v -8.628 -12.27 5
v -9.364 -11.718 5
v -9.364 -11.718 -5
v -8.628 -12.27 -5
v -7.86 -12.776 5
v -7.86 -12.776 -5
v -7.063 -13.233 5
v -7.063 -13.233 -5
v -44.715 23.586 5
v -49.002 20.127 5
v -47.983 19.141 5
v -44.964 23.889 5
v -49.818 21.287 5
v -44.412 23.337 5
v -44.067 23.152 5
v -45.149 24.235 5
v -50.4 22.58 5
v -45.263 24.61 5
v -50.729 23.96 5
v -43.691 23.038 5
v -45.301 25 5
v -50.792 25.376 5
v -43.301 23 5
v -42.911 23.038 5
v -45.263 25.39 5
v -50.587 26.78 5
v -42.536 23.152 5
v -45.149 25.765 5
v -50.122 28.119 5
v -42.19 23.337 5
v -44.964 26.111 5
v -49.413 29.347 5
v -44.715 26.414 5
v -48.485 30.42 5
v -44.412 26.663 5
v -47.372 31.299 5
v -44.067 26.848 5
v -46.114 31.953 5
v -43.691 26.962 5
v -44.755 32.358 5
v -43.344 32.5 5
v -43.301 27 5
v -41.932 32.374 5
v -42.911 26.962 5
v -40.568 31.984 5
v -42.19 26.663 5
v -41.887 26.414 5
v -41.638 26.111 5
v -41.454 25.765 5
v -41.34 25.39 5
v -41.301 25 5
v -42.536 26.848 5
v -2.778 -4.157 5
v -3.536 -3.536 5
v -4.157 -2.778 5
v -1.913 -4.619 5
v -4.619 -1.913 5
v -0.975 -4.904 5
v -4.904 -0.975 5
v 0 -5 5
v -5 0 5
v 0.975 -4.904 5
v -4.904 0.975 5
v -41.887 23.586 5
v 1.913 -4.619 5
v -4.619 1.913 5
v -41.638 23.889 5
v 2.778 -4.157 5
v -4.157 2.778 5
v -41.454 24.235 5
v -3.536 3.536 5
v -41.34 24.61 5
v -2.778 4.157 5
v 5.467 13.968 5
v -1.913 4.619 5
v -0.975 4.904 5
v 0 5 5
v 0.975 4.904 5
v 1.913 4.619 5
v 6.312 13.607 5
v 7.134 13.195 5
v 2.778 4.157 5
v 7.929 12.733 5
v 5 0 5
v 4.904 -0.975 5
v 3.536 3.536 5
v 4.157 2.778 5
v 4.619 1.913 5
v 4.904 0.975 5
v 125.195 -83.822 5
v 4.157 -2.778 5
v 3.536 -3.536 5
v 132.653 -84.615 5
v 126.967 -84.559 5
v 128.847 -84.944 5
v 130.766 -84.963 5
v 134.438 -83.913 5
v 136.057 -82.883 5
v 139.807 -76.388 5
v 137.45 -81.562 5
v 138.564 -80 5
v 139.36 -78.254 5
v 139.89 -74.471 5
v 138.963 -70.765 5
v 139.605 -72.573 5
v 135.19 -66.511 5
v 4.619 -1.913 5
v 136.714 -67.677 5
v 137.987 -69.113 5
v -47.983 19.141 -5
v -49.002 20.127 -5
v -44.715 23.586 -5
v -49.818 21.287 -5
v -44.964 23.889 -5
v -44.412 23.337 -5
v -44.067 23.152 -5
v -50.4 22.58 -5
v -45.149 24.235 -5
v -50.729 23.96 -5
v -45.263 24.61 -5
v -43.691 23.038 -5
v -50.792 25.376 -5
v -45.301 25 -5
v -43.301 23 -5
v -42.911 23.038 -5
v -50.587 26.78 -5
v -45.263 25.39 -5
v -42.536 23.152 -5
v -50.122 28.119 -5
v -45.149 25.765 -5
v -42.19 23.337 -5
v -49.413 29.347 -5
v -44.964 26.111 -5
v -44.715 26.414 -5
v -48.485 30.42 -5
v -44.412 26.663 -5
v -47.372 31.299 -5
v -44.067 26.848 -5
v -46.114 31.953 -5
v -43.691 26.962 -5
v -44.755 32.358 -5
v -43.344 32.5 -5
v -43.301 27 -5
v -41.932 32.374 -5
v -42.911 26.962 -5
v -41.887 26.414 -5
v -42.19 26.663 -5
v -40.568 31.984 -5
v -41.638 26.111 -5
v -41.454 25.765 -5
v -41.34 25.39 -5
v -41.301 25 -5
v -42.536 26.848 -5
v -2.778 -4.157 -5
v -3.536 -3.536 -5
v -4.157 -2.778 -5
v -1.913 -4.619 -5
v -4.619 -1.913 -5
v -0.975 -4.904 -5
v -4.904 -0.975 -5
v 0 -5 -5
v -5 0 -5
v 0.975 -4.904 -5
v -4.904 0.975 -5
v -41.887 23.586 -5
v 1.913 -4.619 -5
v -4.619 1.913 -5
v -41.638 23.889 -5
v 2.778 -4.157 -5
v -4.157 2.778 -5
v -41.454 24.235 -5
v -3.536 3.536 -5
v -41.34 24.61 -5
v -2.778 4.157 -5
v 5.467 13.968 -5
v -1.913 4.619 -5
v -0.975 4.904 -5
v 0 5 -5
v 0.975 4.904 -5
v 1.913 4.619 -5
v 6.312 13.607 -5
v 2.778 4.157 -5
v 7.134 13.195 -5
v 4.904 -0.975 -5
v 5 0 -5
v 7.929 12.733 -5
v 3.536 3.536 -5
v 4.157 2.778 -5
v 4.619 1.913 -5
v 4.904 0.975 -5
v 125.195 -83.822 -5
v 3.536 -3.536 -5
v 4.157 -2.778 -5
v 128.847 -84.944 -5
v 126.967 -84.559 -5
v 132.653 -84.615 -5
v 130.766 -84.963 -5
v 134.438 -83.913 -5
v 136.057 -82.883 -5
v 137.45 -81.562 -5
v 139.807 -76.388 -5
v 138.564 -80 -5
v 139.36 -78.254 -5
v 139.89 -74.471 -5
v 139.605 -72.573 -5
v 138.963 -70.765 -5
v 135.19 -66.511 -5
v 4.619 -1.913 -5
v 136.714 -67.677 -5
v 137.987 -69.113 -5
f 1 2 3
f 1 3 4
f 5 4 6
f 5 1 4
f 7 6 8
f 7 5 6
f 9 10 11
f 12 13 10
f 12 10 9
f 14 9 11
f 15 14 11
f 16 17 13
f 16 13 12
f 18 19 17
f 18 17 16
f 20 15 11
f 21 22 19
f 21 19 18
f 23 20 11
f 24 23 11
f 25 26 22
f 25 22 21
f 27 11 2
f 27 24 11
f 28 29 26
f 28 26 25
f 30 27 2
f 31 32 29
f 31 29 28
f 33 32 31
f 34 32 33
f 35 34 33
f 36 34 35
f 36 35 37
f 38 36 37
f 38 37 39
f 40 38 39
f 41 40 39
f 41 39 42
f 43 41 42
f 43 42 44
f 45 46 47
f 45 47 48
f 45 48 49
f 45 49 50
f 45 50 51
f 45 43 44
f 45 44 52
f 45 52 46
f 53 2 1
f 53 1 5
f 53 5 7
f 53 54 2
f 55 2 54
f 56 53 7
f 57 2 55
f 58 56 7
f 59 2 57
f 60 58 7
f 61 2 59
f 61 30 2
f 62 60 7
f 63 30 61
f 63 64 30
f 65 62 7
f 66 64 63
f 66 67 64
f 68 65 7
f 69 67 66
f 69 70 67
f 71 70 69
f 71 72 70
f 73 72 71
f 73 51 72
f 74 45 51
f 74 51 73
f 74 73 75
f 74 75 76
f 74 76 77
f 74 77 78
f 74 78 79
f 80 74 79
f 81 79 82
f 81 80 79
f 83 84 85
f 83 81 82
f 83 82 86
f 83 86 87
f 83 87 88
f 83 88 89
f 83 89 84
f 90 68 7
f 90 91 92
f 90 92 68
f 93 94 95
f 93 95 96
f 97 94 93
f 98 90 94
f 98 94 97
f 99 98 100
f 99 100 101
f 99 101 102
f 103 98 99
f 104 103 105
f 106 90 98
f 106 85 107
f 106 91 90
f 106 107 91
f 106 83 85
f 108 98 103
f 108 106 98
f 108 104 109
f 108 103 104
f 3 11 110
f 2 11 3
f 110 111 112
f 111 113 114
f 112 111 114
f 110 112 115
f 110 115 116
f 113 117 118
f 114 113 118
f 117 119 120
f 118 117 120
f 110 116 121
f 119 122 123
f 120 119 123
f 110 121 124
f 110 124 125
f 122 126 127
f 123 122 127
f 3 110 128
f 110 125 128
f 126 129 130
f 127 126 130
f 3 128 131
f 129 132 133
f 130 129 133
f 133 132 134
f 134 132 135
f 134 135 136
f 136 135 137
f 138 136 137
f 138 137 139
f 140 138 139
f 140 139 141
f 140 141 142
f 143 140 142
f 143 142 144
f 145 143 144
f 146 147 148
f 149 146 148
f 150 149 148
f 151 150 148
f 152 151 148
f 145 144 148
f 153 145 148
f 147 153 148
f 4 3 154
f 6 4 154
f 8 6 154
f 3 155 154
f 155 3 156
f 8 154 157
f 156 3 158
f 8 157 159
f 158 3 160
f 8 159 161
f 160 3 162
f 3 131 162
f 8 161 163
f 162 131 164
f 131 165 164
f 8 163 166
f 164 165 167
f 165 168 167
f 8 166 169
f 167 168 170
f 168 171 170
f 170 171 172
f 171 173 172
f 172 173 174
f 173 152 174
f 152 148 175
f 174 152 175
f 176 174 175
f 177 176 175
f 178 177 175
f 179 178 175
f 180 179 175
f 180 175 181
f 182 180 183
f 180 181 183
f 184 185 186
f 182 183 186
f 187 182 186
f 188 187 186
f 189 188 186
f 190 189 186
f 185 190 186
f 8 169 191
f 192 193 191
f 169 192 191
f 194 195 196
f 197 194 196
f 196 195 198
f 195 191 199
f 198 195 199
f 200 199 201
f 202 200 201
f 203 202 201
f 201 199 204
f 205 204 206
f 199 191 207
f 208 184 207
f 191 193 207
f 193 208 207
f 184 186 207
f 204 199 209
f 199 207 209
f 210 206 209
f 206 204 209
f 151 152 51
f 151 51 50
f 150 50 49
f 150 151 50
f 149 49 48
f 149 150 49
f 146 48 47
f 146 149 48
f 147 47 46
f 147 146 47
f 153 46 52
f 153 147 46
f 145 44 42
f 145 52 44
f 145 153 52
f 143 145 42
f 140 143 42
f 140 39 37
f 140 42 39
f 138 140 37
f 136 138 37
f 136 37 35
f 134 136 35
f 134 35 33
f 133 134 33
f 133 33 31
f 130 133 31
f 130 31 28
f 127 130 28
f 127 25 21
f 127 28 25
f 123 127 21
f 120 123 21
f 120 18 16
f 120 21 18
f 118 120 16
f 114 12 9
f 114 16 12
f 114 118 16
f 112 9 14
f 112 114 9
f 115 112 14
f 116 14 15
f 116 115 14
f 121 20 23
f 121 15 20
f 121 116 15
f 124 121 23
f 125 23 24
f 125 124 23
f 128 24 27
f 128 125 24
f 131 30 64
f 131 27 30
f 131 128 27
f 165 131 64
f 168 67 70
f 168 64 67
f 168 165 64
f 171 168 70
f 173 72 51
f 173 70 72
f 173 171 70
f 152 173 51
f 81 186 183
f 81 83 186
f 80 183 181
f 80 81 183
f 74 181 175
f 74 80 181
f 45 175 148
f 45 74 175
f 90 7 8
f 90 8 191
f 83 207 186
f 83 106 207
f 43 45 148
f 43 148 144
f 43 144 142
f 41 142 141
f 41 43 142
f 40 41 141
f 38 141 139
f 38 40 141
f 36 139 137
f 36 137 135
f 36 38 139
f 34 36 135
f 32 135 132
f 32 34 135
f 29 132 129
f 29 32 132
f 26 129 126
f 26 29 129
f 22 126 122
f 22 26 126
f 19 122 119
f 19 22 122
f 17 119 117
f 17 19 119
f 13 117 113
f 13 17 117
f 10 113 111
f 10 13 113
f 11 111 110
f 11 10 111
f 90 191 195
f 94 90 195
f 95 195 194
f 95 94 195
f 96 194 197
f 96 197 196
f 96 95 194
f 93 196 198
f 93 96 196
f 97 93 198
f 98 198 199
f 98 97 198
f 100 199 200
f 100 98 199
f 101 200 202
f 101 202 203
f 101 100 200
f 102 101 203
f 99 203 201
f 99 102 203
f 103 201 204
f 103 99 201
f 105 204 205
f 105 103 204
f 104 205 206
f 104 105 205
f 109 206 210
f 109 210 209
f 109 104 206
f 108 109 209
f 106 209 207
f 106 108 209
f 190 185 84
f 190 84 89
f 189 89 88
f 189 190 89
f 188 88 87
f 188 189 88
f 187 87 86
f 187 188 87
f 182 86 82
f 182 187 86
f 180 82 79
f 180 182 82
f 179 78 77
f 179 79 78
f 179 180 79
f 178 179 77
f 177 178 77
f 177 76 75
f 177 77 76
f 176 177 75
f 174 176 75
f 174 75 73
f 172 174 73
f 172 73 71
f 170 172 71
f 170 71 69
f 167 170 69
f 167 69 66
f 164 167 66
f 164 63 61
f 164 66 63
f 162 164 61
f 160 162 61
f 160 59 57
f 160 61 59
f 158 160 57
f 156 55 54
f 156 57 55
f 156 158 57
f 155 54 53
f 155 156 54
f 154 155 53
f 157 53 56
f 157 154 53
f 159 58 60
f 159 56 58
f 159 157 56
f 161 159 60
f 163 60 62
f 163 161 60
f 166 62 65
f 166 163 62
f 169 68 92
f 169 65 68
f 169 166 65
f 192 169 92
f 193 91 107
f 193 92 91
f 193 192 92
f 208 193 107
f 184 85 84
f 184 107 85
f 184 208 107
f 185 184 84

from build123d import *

# Parameters (mm, degrees)
BOSS_EXTRUDE1_DEPTH     = 5
CUT_EXTRUDE1_DEPTH      = 164.77752047
CUT_EXTRUDE1_DEPTH_BACK = 164.77752047
SKETCH2_R               = 2
SKETCH2_R_2             = 5


with BuildPart() as part:
    # Sketch1 → Boss-Extrude1 (new, symmetric)
    with BuildSketch(Plane.XY):
        with BuildLine():
            Line((5.466587816, 13.968407842), (-40.567976281, 31.984203921))
            ThreePointArc((-40.567976281, 31.984203921), (-49.796460718, 28.75), (-47.983121256, 19.140796079))
            Line((-47.983121256, 19.140796079), (-9.363702133, -11.718407842))
            ThreePointArc((-9.363702133, -11.718407842), (-8.248107249, -12.528716088), (-7.062819473, -13.233162173))
            Line((-7.062819473, -13.233162173), (125.195264252, -83.822108115))
            ThreePointArc((125.195264252, -83.822108115), (138.564064606, -80), (135.189707152, -66.511225218))
            Line((135.189707152, -66.511225218), (7.928844877, 12.733162173))
            ThreePointArc((7.928844877, 12.733162173), (6.726132784, 13.407428455), (5.466587816, 13.968407842))
        make_face()
    extrude(amount=BOSS_EXTRUDE1_DEPTH, both=True)

    # Sketch2 → Cut-Extrude1 (cut, two sides: drawn at the far end of the back side and taken through both)
    with BuildSketch(Plane.XY.offset(-CUT_EXTRUDE1_DEPTH_BACK)):
        with Locations((-43.301270189, 25)):
            Circle(SKETCH2_R)
        Circle(SKETCH2_R_2)
    extrude(amount=CUT_EXTRUDE1_DEPTH + CUT_EXTRUDE1_DEPTH_BACK, mode=Mode.SUBTRACT)


solid = part.part
